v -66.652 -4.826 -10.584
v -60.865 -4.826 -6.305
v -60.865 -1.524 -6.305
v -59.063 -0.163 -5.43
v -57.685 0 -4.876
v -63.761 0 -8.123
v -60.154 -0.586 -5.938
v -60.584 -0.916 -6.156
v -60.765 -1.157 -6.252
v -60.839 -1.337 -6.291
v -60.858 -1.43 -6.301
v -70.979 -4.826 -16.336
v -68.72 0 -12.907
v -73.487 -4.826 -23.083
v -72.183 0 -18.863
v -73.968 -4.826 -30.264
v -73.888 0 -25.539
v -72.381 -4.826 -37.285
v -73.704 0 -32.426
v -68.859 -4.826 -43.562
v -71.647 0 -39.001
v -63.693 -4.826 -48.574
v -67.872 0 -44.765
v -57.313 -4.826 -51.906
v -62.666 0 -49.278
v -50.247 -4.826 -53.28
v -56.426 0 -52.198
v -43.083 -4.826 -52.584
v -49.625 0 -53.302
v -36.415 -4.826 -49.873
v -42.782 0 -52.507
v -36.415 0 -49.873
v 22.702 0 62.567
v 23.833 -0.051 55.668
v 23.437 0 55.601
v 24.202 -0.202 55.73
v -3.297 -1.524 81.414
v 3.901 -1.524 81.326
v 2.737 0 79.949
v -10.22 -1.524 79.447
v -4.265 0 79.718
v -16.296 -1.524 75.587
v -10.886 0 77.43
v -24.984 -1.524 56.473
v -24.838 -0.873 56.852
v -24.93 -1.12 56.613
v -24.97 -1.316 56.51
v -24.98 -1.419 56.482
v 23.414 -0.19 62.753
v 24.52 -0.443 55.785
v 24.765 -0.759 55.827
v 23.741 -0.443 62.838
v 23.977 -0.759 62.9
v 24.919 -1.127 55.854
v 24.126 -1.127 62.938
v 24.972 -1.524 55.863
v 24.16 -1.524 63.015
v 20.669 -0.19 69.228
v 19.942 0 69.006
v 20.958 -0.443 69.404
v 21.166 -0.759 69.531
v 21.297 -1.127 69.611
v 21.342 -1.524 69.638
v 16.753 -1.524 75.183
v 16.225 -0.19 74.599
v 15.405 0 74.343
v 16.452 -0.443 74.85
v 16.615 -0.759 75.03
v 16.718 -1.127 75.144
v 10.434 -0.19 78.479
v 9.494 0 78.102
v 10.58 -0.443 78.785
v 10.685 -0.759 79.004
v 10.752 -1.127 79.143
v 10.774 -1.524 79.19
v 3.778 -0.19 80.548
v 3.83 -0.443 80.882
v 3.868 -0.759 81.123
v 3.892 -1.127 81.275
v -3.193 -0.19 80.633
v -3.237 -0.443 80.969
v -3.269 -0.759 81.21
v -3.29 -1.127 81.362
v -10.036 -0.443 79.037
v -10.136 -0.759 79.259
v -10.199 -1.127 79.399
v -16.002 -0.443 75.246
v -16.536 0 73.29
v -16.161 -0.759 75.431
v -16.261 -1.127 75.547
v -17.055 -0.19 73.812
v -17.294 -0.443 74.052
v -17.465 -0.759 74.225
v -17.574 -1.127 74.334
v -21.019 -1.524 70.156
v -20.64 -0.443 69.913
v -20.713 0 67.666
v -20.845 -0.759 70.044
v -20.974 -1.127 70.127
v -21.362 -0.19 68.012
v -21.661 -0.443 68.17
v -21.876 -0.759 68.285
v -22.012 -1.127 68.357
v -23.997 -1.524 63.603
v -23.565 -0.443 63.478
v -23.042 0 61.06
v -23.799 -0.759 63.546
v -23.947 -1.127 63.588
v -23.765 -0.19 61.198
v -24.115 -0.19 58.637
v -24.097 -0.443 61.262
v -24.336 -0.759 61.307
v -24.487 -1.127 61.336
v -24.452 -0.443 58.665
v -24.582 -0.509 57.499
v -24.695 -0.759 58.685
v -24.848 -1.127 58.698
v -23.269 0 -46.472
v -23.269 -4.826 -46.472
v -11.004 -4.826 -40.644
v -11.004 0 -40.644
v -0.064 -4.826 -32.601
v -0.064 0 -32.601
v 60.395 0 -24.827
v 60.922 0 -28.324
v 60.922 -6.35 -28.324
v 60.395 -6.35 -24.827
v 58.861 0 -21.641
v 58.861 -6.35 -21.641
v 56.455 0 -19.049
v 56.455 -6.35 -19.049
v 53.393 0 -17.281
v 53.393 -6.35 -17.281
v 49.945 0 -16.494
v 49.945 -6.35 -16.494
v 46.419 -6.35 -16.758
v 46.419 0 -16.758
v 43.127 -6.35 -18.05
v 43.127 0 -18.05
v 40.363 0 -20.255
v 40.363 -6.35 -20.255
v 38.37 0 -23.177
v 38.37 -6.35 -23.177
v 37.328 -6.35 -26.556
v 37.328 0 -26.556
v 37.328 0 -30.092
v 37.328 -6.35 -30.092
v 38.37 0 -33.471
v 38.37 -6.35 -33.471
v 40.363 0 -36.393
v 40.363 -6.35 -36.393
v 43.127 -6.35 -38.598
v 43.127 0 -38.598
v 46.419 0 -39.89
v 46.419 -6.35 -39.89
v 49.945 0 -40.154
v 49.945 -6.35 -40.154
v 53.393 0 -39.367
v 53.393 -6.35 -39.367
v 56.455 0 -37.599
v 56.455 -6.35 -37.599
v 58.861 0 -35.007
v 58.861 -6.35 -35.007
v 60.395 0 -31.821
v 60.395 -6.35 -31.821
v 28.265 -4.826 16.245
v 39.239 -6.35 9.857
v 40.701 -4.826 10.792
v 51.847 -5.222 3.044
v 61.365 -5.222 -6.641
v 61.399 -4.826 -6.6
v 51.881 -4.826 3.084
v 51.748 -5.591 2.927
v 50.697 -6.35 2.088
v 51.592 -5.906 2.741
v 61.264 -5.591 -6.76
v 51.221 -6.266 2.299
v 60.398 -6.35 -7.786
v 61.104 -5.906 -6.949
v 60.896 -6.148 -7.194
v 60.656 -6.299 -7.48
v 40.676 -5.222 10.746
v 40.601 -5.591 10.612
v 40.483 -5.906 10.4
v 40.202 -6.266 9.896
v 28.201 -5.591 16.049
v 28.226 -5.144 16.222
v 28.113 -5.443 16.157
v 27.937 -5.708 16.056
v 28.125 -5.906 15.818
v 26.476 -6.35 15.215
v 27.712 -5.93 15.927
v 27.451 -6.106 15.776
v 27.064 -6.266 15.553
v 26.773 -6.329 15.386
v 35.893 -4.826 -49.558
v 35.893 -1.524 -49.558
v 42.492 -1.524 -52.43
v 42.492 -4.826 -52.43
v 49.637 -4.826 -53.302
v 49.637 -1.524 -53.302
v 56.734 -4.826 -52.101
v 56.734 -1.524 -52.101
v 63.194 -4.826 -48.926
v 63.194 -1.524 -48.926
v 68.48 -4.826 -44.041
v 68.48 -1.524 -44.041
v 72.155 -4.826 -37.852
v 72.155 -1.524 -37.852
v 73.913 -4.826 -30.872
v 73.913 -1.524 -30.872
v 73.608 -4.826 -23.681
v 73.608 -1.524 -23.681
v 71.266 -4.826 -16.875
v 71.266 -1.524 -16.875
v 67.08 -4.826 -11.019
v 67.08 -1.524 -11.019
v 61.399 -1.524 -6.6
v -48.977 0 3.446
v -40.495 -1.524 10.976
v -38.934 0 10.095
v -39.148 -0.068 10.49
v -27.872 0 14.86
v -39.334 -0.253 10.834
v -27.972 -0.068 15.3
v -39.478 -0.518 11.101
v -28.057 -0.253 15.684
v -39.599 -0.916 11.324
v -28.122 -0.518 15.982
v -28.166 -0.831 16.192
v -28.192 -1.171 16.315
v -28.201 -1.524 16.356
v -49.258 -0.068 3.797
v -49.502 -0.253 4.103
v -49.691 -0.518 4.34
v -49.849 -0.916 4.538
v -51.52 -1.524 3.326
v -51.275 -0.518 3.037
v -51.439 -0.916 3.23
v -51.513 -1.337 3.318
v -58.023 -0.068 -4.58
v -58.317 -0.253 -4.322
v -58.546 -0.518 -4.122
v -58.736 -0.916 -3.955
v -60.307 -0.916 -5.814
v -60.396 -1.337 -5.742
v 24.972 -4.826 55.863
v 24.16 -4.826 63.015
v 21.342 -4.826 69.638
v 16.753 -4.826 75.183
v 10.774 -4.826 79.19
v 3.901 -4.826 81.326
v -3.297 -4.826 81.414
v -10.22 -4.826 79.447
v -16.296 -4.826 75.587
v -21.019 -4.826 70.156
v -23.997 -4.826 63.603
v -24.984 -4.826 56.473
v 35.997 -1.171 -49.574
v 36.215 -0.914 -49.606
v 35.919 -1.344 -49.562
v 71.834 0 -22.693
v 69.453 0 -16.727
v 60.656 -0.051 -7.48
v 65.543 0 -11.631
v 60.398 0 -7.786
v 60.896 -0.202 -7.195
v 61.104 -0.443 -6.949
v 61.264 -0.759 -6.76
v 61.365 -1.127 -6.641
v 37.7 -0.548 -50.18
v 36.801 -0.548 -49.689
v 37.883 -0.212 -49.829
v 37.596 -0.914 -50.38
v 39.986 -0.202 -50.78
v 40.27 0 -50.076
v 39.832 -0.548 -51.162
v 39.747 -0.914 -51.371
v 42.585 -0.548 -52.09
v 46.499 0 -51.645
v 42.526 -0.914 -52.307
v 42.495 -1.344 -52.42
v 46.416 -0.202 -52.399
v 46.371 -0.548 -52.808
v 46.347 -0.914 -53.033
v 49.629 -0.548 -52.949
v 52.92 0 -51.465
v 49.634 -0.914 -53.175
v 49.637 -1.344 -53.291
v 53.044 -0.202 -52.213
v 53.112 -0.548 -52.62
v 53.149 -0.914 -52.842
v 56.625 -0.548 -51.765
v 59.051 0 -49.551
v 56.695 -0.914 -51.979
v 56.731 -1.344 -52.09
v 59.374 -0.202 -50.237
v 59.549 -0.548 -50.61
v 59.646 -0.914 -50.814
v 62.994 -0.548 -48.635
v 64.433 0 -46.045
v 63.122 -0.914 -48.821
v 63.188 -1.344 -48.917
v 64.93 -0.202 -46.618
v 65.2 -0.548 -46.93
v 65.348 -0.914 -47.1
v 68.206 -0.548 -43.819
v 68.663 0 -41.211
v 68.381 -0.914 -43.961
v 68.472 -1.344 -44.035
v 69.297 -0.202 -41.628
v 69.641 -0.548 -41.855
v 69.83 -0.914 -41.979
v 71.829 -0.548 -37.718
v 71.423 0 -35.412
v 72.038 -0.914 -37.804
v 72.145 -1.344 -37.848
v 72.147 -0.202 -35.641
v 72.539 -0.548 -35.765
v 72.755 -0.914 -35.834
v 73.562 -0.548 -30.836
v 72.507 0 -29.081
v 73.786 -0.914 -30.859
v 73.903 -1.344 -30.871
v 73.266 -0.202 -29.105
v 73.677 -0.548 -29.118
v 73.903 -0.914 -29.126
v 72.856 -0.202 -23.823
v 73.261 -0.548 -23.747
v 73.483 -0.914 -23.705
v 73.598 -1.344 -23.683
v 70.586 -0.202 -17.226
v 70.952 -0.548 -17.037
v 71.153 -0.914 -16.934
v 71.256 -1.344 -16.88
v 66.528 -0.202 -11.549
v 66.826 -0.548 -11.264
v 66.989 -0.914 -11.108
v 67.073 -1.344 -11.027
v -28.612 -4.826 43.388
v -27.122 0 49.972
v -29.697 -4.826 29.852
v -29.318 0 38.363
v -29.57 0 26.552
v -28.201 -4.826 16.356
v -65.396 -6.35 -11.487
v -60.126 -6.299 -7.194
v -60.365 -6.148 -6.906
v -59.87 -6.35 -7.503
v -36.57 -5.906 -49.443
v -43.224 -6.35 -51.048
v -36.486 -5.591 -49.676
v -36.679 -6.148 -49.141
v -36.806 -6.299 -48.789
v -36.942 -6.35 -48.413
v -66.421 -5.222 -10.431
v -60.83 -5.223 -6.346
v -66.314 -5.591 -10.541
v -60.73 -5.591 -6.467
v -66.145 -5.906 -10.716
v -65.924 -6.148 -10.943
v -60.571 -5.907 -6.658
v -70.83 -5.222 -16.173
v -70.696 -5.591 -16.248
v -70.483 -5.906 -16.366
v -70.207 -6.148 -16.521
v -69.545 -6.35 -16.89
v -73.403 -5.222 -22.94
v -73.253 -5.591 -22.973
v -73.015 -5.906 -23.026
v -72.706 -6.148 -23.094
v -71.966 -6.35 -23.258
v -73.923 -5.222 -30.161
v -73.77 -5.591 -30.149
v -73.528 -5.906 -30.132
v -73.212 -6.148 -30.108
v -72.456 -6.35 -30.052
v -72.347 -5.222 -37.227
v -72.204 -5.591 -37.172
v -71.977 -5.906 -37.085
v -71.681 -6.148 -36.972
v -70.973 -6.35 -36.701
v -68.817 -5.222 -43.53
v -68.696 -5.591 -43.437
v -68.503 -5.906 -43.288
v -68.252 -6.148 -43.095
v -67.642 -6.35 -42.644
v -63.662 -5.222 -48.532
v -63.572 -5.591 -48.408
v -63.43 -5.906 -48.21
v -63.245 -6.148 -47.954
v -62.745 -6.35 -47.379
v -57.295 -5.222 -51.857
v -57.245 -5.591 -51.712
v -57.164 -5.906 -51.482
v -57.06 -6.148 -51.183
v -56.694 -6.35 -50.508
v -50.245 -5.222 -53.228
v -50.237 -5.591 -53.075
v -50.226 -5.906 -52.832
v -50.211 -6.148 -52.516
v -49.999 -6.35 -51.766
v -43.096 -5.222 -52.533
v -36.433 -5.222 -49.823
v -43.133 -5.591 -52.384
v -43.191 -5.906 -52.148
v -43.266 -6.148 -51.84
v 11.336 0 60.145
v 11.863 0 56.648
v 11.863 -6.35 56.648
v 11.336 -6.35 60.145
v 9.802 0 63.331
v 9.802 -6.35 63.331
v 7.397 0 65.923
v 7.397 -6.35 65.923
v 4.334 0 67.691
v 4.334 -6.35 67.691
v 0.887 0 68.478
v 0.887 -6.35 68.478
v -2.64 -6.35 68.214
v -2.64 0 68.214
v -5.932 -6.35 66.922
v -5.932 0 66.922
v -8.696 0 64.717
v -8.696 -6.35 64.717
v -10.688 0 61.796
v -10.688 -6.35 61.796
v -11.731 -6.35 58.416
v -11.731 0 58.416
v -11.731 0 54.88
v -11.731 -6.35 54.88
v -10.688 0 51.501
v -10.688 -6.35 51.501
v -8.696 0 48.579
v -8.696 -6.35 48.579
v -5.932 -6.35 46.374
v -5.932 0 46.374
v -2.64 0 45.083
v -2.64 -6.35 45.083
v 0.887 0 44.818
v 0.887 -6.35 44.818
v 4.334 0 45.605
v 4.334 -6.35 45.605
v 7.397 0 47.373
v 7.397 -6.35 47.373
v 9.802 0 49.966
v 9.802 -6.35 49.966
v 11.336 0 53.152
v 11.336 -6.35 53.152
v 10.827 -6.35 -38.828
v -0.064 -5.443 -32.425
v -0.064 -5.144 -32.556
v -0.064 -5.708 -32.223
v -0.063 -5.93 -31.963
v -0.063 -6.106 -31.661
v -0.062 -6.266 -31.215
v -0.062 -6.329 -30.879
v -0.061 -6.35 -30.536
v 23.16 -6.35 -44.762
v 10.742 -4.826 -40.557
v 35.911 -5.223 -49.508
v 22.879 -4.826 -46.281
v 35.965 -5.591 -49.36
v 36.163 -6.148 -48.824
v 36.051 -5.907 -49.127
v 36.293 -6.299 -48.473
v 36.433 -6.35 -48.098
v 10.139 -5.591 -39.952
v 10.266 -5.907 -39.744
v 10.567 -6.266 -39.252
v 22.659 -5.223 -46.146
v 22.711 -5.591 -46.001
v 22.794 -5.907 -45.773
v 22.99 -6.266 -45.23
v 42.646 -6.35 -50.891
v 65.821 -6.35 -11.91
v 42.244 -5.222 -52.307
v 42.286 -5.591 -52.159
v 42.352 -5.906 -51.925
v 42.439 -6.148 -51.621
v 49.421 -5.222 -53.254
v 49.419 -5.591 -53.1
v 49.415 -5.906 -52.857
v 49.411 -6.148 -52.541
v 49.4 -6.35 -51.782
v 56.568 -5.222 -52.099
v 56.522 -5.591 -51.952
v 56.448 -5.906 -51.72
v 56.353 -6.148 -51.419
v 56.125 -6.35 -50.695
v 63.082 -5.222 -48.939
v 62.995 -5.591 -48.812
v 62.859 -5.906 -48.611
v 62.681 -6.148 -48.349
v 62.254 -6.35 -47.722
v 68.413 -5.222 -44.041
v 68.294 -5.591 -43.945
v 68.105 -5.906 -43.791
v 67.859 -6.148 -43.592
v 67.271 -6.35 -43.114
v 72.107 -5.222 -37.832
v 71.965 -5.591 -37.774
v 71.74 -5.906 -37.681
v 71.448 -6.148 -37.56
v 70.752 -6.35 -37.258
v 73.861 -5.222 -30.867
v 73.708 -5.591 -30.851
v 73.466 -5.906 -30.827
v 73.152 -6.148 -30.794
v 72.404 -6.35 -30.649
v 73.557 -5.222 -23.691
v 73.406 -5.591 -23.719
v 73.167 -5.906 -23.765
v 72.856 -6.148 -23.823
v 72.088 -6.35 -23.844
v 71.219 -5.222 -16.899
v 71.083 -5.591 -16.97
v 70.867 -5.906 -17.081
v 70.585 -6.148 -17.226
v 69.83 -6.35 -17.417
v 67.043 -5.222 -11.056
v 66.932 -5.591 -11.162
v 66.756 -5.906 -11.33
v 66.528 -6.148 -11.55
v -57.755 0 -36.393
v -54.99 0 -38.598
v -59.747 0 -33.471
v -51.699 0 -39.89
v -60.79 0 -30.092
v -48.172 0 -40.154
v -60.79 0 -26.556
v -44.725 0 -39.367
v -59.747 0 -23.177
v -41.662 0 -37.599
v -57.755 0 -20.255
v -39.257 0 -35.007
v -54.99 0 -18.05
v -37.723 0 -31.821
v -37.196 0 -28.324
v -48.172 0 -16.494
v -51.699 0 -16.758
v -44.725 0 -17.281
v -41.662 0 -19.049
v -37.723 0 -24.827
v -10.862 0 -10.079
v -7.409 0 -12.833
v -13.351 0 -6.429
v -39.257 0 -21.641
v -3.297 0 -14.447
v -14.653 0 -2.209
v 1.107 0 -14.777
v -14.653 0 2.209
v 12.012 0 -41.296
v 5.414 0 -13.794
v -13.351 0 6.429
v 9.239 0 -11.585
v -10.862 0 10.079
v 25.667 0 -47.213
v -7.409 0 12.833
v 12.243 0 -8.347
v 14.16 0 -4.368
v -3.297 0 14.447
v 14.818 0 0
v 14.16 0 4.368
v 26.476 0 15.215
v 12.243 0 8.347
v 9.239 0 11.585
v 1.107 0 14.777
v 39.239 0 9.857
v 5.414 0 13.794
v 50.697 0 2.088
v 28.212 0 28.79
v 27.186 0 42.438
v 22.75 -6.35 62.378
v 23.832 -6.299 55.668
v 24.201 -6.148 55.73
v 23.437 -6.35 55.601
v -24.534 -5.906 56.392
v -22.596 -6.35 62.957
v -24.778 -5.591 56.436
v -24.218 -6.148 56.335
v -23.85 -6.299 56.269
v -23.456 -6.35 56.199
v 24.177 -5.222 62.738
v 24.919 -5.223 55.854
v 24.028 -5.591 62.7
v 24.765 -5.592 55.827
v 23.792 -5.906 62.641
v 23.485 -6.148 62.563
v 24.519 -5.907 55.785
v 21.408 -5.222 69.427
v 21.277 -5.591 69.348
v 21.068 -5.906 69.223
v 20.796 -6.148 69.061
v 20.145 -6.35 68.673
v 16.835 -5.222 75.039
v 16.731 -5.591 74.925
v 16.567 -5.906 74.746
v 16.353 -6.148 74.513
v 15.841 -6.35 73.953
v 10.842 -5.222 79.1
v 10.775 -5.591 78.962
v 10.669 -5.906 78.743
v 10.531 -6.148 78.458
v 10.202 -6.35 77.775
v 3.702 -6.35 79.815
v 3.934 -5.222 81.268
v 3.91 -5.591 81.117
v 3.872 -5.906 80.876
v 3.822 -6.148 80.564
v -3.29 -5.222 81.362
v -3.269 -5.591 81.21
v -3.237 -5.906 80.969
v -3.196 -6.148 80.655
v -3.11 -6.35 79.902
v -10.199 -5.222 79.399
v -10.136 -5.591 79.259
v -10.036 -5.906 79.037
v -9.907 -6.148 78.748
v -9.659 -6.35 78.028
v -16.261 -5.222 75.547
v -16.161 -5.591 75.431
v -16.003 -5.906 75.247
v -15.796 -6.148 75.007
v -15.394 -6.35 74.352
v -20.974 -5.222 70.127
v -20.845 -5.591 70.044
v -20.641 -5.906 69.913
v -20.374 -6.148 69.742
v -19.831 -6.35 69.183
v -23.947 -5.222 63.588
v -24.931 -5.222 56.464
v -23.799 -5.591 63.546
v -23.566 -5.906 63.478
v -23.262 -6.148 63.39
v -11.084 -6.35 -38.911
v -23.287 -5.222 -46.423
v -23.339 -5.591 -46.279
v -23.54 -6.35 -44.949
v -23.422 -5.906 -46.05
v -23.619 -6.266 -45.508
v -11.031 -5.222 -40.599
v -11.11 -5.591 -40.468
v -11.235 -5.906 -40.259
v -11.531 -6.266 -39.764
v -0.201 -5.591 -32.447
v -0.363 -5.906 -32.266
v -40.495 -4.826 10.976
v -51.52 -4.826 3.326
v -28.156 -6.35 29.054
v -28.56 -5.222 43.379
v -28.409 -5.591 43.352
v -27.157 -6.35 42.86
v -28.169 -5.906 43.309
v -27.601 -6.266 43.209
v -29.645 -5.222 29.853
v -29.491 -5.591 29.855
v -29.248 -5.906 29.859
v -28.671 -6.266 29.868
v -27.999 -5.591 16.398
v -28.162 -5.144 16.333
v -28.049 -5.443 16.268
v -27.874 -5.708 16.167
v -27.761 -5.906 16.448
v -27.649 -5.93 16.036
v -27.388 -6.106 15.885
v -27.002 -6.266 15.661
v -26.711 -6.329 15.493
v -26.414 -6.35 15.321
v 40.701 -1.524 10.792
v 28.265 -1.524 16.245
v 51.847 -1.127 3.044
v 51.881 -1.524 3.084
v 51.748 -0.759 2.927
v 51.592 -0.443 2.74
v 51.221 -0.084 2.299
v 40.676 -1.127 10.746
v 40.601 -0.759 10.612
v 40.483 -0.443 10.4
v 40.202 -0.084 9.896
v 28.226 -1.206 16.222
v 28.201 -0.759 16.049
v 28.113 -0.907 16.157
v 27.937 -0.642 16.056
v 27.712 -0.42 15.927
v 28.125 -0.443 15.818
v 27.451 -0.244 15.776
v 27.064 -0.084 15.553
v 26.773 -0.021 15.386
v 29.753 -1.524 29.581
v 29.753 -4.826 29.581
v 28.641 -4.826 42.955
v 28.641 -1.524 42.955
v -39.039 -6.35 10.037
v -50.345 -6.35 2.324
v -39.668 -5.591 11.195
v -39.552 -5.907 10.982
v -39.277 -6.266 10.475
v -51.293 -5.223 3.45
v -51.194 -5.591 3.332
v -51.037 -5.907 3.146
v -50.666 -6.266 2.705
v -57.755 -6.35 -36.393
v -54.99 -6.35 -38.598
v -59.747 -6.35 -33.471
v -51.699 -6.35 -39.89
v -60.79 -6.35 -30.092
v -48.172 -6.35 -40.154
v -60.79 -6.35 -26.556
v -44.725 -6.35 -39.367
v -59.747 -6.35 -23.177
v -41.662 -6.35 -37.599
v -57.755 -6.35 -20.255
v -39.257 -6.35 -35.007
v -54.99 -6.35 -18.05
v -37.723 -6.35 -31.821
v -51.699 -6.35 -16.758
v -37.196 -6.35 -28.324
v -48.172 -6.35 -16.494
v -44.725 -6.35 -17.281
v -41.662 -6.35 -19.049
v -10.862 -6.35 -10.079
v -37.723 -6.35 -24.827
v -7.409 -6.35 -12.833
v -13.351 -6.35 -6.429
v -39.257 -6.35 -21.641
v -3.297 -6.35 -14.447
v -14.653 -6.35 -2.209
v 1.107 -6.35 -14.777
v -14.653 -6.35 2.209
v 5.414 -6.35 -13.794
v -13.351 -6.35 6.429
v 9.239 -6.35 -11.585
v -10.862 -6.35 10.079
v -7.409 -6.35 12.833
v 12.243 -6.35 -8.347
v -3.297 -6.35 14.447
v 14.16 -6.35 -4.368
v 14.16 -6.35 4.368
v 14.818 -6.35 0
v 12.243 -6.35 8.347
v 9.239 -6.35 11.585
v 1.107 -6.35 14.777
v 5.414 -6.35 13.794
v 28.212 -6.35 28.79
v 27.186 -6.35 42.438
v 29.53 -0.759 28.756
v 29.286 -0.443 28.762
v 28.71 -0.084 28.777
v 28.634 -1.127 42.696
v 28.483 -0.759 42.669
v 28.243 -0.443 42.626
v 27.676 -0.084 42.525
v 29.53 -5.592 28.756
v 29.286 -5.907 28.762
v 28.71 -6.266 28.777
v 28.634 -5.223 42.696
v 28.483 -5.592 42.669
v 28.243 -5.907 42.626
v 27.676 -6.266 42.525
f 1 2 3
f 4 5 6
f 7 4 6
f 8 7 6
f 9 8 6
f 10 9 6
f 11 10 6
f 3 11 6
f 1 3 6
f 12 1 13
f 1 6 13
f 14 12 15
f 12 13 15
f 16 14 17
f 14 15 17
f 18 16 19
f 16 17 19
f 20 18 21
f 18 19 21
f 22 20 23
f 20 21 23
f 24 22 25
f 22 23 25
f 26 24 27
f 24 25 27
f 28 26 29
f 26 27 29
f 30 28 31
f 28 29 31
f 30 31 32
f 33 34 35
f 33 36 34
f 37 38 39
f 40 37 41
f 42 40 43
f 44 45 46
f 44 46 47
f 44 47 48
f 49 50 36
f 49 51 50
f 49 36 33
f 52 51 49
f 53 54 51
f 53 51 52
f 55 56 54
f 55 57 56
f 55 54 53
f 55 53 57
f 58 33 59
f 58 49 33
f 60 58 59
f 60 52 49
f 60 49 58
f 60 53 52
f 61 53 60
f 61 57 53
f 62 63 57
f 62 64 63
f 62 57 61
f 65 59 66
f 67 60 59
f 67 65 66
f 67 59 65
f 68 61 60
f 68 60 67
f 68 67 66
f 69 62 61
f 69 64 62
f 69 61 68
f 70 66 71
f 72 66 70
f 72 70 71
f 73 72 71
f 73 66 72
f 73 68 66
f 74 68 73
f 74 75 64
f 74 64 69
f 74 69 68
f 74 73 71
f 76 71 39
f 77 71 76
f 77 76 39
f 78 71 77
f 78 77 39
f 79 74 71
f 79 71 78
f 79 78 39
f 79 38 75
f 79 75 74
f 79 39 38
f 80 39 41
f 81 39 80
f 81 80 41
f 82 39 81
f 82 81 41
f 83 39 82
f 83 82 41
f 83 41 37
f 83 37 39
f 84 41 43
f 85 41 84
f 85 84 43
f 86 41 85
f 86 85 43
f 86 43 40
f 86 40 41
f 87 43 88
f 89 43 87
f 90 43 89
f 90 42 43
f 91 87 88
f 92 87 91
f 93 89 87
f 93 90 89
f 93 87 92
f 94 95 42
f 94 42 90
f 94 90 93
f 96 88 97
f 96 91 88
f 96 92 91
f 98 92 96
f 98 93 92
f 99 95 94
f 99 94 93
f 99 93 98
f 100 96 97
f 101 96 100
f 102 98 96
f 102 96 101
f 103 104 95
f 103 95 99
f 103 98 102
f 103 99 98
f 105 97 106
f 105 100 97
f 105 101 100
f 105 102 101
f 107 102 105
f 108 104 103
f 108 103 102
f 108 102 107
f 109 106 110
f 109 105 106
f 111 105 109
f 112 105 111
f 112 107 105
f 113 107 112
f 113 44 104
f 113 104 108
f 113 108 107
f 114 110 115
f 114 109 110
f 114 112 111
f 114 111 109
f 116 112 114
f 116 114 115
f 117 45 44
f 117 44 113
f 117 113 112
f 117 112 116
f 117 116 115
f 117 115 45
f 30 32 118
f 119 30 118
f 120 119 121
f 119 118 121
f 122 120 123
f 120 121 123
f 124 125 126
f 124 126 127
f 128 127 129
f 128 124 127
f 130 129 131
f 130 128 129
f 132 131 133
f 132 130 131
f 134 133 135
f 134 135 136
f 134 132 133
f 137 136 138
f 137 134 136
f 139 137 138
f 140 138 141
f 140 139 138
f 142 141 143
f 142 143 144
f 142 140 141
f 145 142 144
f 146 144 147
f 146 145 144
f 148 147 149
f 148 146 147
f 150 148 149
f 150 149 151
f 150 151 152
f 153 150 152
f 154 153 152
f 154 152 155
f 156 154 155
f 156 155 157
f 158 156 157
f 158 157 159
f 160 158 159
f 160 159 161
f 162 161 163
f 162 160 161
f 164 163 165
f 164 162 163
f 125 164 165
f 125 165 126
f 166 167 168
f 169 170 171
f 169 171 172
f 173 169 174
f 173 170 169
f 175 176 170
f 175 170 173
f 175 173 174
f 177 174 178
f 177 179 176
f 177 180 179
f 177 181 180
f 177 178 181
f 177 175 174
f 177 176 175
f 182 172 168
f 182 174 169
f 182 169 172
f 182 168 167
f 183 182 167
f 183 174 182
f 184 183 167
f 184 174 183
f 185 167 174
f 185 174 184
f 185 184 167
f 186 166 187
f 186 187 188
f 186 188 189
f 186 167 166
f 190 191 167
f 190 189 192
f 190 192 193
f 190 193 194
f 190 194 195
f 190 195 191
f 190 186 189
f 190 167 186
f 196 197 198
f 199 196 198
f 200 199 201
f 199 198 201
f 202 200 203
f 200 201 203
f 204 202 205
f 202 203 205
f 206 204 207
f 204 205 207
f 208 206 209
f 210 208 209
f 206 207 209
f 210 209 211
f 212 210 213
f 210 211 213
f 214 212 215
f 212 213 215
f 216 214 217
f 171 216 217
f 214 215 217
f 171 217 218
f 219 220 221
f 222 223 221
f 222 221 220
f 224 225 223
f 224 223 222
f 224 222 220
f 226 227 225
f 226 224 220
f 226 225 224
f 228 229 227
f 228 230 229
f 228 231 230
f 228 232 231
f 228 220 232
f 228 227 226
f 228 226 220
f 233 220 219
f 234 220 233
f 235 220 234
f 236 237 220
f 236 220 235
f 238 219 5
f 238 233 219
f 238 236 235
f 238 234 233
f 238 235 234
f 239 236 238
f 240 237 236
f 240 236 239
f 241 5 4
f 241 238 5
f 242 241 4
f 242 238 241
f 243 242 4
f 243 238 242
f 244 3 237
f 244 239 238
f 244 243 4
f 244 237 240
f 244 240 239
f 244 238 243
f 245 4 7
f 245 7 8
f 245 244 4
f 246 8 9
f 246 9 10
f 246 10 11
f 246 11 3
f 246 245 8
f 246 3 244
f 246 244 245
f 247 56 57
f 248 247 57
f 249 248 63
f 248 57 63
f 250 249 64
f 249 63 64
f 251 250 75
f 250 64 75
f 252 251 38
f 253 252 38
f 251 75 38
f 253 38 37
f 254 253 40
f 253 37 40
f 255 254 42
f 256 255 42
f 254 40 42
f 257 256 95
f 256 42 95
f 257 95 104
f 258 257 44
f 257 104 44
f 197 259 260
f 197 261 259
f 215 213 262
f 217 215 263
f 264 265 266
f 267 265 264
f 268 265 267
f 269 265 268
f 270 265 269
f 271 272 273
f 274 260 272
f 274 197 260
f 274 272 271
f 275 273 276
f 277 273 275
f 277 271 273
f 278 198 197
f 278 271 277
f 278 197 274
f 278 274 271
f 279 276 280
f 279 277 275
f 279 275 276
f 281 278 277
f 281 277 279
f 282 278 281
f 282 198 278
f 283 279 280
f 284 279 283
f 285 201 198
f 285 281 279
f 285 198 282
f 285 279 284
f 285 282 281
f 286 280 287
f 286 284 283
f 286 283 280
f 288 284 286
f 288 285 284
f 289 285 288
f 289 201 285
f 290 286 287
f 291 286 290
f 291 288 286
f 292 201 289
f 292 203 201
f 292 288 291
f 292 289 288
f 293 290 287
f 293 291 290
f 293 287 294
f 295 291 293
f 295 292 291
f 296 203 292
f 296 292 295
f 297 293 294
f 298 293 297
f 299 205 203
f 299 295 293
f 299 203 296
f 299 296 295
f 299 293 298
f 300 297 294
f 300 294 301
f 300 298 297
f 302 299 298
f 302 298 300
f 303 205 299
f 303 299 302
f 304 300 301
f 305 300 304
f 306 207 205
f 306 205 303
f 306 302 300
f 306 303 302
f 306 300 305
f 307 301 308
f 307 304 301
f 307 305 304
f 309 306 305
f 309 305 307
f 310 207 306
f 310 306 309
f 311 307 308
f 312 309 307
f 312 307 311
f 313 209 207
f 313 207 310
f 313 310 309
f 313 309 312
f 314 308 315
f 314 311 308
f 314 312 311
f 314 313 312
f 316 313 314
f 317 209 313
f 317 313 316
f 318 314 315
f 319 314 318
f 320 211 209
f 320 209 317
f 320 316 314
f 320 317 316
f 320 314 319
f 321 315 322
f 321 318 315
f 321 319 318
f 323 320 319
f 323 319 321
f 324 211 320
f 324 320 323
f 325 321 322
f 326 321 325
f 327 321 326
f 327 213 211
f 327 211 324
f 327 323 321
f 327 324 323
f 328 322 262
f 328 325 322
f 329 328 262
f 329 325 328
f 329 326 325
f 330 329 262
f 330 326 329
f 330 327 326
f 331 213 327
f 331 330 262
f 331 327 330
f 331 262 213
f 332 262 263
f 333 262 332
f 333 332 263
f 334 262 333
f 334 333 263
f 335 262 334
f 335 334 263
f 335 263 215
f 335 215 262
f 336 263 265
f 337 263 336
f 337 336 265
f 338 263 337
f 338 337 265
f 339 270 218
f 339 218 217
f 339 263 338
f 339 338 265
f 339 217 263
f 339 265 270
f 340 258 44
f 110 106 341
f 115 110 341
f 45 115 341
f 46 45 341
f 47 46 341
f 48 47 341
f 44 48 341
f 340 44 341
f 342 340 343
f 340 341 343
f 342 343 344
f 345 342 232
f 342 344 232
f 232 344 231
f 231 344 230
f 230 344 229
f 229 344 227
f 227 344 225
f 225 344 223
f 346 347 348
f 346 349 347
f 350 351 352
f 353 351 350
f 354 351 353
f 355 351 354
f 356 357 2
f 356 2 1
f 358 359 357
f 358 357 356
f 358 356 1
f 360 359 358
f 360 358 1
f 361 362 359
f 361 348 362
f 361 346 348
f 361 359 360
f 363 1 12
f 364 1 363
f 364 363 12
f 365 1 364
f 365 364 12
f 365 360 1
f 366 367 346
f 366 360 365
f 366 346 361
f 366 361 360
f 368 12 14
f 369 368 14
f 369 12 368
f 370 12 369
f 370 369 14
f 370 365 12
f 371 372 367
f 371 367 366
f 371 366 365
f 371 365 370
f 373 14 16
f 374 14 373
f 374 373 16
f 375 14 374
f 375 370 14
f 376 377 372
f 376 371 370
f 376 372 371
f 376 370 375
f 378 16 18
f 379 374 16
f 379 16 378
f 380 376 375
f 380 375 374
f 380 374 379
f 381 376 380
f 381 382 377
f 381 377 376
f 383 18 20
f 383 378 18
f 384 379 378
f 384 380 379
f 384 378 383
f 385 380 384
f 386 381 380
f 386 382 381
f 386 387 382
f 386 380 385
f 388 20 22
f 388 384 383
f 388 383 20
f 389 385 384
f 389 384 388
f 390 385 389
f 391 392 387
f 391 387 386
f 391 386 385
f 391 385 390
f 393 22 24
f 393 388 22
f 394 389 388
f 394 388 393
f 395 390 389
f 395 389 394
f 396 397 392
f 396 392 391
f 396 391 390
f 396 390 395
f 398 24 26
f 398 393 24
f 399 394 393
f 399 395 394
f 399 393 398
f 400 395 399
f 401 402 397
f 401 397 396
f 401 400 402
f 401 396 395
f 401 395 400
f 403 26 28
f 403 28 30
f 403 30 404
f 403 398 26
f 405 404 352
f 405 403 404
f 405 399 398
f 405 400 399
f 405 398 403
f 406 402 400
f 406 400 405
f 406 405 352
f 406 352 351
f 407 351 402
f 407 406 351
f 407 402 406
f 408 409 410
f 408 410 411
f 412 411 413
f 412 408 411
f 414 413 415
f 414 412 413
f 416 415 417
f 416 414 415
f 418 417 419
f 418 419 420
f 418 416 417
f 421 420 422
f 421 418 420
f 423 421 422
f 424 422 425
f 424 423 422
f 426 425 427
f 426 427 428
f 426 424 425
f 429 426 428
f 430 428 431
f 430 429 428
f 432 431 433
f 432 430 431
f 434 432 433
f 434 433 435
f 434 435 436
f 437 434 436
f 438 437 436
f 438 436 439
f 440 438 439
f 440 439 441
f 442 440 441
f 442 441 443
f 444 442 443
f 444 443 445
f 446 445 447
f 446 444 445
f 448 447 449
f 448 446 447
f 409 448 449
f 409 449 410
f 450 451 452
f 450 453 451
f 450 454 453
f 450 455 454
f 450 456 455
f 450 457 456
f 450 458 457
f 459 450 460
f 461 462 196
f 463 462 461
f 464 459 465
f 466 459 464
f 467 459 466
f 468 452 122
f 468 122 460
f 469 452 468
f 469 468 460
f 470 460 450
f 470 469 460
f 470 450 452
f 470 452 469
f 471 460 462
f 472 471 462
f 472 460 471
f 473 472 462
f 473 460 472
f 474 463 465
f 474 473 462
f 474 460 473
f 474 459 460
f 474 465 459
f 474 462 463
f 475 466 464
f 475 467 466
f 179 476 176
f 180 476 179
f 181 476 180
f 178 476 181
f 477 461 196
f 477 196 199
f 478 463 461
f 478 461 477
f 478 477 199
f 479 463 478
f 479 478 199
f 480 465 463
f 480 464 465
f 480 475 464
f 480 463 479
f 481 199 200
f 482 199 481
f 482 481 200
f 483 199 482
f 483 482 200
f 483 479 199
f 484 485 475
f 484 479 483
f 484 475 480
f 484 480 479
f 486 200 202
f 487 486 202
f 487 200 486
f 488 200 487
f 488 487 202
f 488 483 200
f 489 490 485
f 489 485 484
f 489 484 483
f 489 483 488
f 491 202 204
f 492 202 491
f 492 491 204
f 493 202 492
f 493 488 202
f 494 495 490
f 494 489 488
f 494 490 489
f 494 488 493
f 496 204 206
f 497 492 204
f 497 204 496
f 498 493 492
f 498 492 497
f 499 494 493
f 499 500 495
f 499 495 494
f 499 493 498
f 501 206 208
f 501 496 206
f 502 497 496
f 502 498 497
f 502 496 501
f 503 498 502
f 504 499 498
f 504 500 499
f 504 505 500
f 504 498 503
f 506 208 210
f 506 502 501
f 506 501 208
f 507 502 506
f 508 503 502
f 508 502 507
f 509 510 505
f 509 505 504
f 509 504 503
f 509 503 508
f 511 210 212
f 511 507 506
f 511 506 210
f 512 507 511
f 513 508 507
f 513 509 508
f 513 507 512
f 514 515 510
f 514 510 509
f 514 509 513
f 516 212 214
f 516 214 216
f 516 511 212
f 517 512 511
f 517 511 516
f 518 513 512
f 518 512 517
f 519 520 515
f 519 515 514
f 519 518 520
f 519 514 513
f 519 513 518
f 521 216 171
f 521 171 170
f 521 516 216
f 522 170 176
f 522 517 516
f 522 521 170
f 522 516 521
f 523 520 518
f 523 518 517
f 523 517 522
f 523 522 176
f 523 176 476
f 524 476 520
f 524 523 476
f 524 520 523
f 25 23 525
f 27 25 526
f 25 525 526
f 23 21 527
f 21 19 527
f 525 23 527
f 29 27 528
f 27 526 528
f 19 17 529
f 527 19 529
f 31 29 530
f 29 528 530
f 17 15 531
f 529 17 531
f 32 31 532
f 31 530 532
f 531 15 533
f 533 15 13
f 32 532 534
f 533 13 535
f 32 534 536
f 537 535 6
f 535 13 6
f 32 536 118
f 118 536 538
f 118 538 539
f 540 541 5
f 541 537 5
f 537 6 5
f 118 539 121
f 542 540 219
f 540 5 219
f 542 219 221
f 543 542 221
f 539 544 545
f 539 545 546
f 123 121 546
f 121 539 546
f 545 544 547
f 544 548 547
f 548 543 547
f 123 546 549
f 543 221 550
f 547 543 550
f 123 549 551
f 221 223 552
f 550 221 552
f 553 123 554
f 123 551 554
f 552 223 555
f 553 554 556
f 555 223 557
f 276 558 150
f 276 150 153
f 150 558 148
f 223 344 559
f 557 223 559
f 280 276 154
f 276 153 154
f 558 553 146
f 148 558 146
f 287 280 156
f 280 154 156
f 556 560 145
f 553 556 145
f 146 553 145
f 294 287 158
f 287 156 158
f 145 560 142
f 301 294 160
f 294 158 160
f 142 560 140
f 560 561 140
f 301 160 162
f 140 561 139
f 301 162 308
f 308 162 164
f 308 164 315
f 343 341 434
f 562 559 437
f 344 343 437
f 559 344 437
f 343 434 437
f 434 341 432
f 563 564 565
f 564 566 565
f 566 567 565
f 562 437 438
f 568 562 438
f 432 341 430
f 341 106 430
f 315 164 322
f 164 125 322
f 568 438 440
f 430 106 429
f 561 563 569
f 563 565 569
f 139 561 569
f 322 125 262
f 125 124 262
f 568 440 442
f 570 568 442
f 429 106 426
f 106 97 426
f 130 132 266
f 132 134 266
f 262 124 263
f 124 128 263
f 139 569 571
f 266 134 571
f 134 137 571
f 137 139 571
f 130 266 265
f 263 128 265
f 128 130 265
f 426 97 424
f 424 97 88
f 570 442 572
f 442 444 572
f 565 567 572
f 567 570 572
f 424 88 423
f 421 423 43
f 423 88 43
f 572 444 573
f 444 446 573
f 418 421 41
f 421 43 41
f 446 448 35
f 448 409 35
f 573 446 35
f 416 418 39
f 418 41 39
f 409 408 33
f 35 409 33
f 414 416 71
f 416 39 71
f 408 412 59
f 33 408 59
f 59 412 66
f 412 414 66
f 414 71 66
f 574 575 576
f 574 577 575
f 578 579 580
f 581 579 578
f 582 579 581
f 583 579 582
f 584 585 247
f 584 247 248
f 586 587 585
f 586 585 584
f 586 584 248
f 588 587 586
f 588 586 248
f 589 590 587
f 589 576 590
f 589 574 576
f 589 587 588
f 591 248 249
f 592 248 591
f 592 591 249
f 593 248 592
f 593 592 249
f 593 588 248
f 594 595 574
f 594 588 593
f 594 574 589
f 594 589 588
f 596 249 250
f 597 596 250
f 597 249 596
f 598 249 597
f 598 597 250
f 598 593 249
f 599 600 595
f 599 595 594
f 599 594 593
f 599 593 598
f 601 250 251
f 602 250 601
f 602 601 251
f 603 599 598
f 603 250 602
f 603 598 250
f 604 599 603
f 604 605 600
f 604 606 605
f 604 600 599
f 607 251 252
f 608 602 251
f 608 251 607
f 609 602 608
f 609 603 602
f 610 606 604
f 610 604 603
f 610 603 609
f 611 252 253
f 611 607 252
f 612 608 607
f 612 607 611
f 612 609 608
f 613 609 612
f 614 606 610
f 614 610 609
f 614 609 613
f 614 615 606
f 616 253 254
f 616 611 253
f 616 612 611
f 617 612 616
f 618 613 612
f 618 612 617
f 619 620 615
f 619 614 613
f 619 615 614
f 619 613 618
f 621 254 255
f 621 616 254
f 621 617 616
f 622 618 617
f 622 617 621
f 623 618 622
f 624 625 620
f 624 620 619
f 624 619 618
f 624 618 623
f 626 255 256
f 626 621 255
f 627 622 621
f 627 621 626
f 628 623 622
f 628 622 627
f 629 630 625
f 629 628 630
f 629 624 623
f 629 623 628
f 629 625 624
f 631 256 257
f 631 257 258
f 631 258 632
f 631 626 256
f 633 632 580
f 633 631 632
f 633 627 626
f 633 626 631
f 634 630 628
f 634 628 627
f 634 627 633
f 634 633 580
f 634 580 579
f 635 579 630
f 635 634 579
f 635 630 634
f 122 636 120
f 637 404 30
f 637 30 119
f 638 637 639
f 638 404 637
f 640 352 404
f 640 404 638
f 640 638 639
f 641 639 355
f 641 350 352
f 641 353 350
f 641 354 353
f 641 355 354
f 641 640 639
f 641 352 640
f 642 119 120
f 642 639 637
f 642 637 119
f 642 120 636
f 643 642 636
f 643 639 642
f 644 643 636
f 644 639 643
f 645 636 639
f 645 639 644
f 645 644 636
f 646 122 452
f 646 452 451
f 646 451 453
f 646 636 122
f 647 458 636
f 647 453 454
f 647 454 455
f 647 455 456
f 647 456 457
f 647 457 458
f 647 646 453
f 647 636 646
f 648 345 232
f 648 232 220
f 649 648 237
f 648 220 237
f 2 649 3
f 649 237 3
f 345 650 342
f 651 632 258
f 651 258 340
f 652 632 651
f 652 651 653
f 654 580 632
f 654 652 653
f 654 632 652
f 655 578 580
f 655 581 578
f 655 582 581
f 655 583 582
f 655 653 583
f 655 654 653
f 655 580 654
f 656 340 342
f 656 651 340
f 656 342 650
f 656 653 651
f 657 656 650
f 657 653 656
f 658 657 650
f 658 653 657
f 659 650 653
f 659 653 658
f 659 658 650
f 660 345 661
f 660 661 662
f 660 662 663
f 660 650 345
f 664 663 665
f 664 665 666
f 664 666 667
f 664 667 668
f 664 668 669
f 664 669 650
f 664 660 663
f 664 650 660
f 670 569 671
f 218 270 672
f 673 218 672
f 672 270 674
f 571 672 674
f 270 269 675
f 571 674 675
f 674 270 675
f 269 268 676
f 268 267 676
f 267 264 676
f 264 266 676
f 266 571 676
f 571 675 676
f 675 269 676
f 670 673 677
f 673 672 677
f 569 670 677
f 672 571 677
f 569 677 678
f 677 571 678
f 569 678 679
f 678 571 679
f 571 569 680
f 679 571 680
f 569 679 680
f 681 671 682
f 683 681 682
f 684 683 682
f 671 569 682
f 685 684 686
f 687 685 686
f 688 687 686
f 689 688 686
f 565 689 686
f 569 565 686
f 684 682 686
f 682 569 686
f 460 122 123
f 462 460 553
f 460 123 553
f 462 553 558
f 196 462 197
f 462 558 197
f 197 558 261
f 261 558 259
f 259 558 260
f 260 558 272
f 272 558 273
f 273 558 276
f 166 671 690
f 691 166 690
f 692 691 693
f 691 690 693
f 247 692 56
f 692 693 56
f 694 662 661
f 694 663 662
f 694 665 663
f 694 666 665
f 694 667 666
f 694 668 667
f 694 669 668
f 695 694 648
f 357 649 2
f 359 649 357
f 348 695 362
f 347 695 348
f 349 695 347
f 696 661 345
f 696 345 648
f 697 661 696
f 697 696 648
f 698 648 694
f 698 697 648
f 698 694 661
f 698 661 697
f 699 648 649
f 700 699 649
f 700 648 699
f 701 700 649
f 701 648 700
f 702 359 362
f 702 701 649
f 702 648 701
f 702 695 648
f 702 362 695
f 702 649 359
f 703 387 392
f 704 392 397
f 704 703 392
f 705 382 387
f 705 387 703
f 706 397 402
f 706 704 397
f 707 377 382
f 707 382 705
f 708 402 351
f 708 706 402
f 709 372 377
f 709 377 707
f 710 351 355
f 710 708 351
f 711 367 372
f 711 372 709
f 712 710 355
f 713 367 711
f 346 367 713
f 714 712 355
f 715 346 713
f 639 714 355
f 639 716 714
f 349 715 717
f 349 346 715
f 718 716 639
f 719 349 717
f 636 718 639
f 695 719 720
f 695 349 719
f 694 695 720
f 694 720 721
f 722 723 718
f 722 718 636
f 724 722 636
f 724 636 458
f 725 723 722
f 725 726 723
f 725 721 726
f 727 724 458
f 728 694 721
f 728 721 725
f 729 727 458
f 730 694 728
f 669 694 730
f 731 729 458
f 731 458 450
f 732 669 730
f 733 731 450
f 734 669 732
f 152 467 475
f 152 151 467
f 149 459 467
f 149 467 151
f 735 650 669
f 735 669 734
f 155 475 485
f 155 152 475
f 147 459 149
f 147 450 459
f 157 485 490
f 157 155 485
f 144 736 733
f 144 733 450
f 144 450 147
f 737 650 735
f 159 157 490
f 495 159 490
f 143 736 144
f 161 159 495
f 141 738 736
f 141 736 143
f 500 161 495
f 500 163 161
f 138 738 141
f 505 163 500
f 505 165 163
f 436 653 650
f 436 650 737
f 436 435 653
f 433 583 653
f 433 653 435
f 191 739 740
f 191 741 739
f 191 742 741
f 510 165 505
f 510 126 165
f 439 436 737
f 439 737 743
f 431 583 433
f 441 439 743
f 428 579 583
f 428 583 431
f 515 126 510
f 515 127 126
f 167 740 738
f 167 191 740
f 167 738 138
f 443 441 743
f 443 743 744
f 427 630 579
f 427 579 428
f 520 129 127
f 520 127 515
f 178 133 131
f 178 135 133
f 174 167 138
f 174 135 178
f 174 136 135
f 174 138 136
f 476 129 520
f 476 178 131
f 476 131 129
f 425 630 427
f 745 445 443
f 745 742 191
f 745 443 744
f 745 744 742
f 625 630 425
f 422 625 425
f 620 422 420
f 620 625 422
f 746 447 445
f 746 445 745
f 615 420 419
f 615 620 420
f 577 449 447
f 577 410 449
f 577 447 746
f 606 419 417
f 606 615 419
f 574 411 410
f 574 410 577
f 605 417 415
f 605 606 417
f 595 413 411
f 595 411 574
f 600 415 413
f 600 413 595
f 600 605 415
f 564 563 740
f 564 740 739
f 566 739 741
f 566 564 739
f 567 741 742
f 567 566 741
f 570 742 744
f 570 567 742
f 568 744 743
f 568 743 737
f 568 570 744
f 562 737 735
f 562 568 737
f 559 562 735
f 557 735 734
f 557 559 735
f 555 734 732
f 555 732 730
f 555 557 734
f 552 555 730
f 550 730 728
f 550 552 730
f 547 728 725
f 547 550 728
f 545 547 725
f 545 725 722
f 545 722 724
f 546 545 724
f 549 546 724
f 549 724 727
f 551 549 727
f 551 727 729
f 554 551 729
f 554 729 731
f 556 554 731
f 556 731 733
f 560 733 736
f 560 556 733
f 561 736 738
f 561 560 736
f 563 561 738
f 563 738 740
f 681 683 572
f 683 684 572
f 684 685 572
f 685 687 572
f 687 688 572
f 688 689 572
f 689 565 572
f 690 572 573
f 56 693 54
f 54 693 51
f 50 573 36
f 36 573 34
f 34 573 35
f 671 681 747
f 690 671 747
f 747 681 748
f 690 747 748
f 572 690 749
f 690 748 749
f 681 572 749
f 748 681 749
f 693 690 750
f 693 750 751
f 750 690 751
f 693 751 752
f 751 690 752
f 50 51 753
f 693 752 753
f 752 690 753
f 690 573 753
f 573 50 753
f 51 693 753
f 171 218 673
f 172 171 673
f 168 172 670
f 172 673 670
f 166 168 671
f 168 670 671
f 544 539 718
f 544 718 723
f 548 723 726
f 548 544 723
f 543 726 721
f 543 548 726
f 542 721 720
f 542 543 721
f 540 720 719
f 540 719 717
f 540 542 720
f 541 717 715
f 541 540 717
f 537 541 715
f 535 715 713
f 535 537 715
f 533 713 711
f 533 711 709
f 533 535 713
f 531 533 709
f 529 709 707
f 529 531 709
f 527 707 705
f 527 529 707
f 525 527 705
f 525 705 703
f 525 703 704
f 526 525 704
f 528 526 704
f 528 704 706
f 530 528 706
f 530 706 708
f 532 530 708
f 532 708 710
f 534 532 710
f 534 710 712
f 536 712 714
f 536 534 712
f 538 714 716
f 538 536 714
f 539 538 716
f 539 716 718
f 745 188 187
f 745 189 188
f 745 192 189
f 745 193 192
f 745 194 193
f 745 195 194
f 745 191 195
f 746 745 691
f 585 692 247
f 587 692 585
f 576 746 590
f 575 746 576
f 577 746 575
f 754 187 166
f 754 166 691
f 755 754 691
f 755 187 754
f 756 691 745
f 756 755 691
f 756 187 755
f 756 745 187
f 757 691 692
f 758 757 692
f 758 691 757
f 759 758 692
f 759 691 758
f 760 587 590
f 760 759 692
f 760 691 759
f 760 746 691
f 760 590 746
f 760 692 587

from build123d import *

# Parameters (mm, degrees)
F0_R     = 11.8632229494
F0_R_2   = 14.8180946675
F1_DEPTH = 6.35
F2_R     = 1.524


with BuildPart() as f1:
    # F0 (on Front) → F1 (new body)
    with BuildSketch(Plane.XZ):
        with BuildLine():
            ThreePointArc((28.2651000935, 16.2447427168), (29.5213330142, 36.295048472), (24.9722020683, 55.8628355125))
            ThreePointArc((24.9722020683, 55.8628355125), (0.3052404709, 81.6309900945), (-24.9839383466, 56.4732036309))
            ThreePointArc((-24.9839383466, 56.4732036309), (-29.4766408592, 36.6458464542), (-28.2009099175, 16.3559233631))
            ThreePointArc((-28.2009099175, 16.3559233631), (-46.1931005154, 7.4187001078), (-60.8647357154, -6.3048563767))
            ThreePointArc((-60.8647357154, -6.3048563767), (-70.8471313934, -40.5511490452), (-36.4152598042, -49.8733271102))
            ThreePointArc((-36.4152598042, -49.8733271102), (-16.9979135429, -43.8504430294), (-0.064190176, -32.6006660799))
            ThreePointArc((-0.064190176, -32.6006660799), (16.6717675012, -43.7137485798), (35.8925336471, -49.5579791358))
            ThreePointArc((35.8925336471, -49.5579791358), (70.5418909225, -41.0798410493), (61.3991981508, -6.5998765207))
            ThreePointArc((61.3991981508, -6.5998765207), (46.4745544022, 7.2045965752), (28.2651000935, 16.2447427168))
        make_face()
        with Locations((-49.0588693263, -28.3241514117)):
            Circle(F0_R, mode=Mode.SUBTRACT)
        with Locations((49.0588693263, -28.3241514117)):
            Circle(F0_R, mode=Mode.SUBTRACT)
        Circle(F0_R_2, mode=Mode.SUBTRACT)
        with Locations((0, 56.6483028233)):
            Circle(F0_R, mode=Mode.SUBTRACT)
    extrude(amount=F1_DEPTH)

    # F2 (call 1 of 3: OpenCascade refuses the feature's edges together)
    f2_edges = [f1.edges().sort_by_distance(p)[0] for p in [
        (0.30524, -6.35, 81.63099),
        (29.521333, -6.35, 36.295048),
        (46.474554, -6.35, 7.204597),
        (70.541891, -6.35, -41.079841),
        (16.671768, -6.35, -43.713749),
        (-16.997914, -6.35, -43.850443),
        (-70.847131, -6.35, -40.551149),
        (-46.193101, -6.35, 7.4187),
        (-29.476641, -6.35, 36.645846),
    ]]
    fillet(f2_edges, radius=F2_R)

    # F2#2 (call 2 of 3)
    f2_2_edges = [f1.edges().sort_by_distance(p)[0] for p in [
        (0.30524, 0, 81.63099),
        (29.521333, 0, 36.295048),
        (46.474554, 0, 7.204597),
        (70.541891, 0, -41.079841),
    ]]
    fillet(f2_2_edges, radius=F2_R)

    # F2#3 (call 3 of 3)
    f2_3_edges = [f1.edges().sort_by_distance(p)[0] for p in [
        (-46.193101, 0, 7.4187),
    ]]
    fillet(f2_3_edges, radius=F2_R)


solid = f1.part
